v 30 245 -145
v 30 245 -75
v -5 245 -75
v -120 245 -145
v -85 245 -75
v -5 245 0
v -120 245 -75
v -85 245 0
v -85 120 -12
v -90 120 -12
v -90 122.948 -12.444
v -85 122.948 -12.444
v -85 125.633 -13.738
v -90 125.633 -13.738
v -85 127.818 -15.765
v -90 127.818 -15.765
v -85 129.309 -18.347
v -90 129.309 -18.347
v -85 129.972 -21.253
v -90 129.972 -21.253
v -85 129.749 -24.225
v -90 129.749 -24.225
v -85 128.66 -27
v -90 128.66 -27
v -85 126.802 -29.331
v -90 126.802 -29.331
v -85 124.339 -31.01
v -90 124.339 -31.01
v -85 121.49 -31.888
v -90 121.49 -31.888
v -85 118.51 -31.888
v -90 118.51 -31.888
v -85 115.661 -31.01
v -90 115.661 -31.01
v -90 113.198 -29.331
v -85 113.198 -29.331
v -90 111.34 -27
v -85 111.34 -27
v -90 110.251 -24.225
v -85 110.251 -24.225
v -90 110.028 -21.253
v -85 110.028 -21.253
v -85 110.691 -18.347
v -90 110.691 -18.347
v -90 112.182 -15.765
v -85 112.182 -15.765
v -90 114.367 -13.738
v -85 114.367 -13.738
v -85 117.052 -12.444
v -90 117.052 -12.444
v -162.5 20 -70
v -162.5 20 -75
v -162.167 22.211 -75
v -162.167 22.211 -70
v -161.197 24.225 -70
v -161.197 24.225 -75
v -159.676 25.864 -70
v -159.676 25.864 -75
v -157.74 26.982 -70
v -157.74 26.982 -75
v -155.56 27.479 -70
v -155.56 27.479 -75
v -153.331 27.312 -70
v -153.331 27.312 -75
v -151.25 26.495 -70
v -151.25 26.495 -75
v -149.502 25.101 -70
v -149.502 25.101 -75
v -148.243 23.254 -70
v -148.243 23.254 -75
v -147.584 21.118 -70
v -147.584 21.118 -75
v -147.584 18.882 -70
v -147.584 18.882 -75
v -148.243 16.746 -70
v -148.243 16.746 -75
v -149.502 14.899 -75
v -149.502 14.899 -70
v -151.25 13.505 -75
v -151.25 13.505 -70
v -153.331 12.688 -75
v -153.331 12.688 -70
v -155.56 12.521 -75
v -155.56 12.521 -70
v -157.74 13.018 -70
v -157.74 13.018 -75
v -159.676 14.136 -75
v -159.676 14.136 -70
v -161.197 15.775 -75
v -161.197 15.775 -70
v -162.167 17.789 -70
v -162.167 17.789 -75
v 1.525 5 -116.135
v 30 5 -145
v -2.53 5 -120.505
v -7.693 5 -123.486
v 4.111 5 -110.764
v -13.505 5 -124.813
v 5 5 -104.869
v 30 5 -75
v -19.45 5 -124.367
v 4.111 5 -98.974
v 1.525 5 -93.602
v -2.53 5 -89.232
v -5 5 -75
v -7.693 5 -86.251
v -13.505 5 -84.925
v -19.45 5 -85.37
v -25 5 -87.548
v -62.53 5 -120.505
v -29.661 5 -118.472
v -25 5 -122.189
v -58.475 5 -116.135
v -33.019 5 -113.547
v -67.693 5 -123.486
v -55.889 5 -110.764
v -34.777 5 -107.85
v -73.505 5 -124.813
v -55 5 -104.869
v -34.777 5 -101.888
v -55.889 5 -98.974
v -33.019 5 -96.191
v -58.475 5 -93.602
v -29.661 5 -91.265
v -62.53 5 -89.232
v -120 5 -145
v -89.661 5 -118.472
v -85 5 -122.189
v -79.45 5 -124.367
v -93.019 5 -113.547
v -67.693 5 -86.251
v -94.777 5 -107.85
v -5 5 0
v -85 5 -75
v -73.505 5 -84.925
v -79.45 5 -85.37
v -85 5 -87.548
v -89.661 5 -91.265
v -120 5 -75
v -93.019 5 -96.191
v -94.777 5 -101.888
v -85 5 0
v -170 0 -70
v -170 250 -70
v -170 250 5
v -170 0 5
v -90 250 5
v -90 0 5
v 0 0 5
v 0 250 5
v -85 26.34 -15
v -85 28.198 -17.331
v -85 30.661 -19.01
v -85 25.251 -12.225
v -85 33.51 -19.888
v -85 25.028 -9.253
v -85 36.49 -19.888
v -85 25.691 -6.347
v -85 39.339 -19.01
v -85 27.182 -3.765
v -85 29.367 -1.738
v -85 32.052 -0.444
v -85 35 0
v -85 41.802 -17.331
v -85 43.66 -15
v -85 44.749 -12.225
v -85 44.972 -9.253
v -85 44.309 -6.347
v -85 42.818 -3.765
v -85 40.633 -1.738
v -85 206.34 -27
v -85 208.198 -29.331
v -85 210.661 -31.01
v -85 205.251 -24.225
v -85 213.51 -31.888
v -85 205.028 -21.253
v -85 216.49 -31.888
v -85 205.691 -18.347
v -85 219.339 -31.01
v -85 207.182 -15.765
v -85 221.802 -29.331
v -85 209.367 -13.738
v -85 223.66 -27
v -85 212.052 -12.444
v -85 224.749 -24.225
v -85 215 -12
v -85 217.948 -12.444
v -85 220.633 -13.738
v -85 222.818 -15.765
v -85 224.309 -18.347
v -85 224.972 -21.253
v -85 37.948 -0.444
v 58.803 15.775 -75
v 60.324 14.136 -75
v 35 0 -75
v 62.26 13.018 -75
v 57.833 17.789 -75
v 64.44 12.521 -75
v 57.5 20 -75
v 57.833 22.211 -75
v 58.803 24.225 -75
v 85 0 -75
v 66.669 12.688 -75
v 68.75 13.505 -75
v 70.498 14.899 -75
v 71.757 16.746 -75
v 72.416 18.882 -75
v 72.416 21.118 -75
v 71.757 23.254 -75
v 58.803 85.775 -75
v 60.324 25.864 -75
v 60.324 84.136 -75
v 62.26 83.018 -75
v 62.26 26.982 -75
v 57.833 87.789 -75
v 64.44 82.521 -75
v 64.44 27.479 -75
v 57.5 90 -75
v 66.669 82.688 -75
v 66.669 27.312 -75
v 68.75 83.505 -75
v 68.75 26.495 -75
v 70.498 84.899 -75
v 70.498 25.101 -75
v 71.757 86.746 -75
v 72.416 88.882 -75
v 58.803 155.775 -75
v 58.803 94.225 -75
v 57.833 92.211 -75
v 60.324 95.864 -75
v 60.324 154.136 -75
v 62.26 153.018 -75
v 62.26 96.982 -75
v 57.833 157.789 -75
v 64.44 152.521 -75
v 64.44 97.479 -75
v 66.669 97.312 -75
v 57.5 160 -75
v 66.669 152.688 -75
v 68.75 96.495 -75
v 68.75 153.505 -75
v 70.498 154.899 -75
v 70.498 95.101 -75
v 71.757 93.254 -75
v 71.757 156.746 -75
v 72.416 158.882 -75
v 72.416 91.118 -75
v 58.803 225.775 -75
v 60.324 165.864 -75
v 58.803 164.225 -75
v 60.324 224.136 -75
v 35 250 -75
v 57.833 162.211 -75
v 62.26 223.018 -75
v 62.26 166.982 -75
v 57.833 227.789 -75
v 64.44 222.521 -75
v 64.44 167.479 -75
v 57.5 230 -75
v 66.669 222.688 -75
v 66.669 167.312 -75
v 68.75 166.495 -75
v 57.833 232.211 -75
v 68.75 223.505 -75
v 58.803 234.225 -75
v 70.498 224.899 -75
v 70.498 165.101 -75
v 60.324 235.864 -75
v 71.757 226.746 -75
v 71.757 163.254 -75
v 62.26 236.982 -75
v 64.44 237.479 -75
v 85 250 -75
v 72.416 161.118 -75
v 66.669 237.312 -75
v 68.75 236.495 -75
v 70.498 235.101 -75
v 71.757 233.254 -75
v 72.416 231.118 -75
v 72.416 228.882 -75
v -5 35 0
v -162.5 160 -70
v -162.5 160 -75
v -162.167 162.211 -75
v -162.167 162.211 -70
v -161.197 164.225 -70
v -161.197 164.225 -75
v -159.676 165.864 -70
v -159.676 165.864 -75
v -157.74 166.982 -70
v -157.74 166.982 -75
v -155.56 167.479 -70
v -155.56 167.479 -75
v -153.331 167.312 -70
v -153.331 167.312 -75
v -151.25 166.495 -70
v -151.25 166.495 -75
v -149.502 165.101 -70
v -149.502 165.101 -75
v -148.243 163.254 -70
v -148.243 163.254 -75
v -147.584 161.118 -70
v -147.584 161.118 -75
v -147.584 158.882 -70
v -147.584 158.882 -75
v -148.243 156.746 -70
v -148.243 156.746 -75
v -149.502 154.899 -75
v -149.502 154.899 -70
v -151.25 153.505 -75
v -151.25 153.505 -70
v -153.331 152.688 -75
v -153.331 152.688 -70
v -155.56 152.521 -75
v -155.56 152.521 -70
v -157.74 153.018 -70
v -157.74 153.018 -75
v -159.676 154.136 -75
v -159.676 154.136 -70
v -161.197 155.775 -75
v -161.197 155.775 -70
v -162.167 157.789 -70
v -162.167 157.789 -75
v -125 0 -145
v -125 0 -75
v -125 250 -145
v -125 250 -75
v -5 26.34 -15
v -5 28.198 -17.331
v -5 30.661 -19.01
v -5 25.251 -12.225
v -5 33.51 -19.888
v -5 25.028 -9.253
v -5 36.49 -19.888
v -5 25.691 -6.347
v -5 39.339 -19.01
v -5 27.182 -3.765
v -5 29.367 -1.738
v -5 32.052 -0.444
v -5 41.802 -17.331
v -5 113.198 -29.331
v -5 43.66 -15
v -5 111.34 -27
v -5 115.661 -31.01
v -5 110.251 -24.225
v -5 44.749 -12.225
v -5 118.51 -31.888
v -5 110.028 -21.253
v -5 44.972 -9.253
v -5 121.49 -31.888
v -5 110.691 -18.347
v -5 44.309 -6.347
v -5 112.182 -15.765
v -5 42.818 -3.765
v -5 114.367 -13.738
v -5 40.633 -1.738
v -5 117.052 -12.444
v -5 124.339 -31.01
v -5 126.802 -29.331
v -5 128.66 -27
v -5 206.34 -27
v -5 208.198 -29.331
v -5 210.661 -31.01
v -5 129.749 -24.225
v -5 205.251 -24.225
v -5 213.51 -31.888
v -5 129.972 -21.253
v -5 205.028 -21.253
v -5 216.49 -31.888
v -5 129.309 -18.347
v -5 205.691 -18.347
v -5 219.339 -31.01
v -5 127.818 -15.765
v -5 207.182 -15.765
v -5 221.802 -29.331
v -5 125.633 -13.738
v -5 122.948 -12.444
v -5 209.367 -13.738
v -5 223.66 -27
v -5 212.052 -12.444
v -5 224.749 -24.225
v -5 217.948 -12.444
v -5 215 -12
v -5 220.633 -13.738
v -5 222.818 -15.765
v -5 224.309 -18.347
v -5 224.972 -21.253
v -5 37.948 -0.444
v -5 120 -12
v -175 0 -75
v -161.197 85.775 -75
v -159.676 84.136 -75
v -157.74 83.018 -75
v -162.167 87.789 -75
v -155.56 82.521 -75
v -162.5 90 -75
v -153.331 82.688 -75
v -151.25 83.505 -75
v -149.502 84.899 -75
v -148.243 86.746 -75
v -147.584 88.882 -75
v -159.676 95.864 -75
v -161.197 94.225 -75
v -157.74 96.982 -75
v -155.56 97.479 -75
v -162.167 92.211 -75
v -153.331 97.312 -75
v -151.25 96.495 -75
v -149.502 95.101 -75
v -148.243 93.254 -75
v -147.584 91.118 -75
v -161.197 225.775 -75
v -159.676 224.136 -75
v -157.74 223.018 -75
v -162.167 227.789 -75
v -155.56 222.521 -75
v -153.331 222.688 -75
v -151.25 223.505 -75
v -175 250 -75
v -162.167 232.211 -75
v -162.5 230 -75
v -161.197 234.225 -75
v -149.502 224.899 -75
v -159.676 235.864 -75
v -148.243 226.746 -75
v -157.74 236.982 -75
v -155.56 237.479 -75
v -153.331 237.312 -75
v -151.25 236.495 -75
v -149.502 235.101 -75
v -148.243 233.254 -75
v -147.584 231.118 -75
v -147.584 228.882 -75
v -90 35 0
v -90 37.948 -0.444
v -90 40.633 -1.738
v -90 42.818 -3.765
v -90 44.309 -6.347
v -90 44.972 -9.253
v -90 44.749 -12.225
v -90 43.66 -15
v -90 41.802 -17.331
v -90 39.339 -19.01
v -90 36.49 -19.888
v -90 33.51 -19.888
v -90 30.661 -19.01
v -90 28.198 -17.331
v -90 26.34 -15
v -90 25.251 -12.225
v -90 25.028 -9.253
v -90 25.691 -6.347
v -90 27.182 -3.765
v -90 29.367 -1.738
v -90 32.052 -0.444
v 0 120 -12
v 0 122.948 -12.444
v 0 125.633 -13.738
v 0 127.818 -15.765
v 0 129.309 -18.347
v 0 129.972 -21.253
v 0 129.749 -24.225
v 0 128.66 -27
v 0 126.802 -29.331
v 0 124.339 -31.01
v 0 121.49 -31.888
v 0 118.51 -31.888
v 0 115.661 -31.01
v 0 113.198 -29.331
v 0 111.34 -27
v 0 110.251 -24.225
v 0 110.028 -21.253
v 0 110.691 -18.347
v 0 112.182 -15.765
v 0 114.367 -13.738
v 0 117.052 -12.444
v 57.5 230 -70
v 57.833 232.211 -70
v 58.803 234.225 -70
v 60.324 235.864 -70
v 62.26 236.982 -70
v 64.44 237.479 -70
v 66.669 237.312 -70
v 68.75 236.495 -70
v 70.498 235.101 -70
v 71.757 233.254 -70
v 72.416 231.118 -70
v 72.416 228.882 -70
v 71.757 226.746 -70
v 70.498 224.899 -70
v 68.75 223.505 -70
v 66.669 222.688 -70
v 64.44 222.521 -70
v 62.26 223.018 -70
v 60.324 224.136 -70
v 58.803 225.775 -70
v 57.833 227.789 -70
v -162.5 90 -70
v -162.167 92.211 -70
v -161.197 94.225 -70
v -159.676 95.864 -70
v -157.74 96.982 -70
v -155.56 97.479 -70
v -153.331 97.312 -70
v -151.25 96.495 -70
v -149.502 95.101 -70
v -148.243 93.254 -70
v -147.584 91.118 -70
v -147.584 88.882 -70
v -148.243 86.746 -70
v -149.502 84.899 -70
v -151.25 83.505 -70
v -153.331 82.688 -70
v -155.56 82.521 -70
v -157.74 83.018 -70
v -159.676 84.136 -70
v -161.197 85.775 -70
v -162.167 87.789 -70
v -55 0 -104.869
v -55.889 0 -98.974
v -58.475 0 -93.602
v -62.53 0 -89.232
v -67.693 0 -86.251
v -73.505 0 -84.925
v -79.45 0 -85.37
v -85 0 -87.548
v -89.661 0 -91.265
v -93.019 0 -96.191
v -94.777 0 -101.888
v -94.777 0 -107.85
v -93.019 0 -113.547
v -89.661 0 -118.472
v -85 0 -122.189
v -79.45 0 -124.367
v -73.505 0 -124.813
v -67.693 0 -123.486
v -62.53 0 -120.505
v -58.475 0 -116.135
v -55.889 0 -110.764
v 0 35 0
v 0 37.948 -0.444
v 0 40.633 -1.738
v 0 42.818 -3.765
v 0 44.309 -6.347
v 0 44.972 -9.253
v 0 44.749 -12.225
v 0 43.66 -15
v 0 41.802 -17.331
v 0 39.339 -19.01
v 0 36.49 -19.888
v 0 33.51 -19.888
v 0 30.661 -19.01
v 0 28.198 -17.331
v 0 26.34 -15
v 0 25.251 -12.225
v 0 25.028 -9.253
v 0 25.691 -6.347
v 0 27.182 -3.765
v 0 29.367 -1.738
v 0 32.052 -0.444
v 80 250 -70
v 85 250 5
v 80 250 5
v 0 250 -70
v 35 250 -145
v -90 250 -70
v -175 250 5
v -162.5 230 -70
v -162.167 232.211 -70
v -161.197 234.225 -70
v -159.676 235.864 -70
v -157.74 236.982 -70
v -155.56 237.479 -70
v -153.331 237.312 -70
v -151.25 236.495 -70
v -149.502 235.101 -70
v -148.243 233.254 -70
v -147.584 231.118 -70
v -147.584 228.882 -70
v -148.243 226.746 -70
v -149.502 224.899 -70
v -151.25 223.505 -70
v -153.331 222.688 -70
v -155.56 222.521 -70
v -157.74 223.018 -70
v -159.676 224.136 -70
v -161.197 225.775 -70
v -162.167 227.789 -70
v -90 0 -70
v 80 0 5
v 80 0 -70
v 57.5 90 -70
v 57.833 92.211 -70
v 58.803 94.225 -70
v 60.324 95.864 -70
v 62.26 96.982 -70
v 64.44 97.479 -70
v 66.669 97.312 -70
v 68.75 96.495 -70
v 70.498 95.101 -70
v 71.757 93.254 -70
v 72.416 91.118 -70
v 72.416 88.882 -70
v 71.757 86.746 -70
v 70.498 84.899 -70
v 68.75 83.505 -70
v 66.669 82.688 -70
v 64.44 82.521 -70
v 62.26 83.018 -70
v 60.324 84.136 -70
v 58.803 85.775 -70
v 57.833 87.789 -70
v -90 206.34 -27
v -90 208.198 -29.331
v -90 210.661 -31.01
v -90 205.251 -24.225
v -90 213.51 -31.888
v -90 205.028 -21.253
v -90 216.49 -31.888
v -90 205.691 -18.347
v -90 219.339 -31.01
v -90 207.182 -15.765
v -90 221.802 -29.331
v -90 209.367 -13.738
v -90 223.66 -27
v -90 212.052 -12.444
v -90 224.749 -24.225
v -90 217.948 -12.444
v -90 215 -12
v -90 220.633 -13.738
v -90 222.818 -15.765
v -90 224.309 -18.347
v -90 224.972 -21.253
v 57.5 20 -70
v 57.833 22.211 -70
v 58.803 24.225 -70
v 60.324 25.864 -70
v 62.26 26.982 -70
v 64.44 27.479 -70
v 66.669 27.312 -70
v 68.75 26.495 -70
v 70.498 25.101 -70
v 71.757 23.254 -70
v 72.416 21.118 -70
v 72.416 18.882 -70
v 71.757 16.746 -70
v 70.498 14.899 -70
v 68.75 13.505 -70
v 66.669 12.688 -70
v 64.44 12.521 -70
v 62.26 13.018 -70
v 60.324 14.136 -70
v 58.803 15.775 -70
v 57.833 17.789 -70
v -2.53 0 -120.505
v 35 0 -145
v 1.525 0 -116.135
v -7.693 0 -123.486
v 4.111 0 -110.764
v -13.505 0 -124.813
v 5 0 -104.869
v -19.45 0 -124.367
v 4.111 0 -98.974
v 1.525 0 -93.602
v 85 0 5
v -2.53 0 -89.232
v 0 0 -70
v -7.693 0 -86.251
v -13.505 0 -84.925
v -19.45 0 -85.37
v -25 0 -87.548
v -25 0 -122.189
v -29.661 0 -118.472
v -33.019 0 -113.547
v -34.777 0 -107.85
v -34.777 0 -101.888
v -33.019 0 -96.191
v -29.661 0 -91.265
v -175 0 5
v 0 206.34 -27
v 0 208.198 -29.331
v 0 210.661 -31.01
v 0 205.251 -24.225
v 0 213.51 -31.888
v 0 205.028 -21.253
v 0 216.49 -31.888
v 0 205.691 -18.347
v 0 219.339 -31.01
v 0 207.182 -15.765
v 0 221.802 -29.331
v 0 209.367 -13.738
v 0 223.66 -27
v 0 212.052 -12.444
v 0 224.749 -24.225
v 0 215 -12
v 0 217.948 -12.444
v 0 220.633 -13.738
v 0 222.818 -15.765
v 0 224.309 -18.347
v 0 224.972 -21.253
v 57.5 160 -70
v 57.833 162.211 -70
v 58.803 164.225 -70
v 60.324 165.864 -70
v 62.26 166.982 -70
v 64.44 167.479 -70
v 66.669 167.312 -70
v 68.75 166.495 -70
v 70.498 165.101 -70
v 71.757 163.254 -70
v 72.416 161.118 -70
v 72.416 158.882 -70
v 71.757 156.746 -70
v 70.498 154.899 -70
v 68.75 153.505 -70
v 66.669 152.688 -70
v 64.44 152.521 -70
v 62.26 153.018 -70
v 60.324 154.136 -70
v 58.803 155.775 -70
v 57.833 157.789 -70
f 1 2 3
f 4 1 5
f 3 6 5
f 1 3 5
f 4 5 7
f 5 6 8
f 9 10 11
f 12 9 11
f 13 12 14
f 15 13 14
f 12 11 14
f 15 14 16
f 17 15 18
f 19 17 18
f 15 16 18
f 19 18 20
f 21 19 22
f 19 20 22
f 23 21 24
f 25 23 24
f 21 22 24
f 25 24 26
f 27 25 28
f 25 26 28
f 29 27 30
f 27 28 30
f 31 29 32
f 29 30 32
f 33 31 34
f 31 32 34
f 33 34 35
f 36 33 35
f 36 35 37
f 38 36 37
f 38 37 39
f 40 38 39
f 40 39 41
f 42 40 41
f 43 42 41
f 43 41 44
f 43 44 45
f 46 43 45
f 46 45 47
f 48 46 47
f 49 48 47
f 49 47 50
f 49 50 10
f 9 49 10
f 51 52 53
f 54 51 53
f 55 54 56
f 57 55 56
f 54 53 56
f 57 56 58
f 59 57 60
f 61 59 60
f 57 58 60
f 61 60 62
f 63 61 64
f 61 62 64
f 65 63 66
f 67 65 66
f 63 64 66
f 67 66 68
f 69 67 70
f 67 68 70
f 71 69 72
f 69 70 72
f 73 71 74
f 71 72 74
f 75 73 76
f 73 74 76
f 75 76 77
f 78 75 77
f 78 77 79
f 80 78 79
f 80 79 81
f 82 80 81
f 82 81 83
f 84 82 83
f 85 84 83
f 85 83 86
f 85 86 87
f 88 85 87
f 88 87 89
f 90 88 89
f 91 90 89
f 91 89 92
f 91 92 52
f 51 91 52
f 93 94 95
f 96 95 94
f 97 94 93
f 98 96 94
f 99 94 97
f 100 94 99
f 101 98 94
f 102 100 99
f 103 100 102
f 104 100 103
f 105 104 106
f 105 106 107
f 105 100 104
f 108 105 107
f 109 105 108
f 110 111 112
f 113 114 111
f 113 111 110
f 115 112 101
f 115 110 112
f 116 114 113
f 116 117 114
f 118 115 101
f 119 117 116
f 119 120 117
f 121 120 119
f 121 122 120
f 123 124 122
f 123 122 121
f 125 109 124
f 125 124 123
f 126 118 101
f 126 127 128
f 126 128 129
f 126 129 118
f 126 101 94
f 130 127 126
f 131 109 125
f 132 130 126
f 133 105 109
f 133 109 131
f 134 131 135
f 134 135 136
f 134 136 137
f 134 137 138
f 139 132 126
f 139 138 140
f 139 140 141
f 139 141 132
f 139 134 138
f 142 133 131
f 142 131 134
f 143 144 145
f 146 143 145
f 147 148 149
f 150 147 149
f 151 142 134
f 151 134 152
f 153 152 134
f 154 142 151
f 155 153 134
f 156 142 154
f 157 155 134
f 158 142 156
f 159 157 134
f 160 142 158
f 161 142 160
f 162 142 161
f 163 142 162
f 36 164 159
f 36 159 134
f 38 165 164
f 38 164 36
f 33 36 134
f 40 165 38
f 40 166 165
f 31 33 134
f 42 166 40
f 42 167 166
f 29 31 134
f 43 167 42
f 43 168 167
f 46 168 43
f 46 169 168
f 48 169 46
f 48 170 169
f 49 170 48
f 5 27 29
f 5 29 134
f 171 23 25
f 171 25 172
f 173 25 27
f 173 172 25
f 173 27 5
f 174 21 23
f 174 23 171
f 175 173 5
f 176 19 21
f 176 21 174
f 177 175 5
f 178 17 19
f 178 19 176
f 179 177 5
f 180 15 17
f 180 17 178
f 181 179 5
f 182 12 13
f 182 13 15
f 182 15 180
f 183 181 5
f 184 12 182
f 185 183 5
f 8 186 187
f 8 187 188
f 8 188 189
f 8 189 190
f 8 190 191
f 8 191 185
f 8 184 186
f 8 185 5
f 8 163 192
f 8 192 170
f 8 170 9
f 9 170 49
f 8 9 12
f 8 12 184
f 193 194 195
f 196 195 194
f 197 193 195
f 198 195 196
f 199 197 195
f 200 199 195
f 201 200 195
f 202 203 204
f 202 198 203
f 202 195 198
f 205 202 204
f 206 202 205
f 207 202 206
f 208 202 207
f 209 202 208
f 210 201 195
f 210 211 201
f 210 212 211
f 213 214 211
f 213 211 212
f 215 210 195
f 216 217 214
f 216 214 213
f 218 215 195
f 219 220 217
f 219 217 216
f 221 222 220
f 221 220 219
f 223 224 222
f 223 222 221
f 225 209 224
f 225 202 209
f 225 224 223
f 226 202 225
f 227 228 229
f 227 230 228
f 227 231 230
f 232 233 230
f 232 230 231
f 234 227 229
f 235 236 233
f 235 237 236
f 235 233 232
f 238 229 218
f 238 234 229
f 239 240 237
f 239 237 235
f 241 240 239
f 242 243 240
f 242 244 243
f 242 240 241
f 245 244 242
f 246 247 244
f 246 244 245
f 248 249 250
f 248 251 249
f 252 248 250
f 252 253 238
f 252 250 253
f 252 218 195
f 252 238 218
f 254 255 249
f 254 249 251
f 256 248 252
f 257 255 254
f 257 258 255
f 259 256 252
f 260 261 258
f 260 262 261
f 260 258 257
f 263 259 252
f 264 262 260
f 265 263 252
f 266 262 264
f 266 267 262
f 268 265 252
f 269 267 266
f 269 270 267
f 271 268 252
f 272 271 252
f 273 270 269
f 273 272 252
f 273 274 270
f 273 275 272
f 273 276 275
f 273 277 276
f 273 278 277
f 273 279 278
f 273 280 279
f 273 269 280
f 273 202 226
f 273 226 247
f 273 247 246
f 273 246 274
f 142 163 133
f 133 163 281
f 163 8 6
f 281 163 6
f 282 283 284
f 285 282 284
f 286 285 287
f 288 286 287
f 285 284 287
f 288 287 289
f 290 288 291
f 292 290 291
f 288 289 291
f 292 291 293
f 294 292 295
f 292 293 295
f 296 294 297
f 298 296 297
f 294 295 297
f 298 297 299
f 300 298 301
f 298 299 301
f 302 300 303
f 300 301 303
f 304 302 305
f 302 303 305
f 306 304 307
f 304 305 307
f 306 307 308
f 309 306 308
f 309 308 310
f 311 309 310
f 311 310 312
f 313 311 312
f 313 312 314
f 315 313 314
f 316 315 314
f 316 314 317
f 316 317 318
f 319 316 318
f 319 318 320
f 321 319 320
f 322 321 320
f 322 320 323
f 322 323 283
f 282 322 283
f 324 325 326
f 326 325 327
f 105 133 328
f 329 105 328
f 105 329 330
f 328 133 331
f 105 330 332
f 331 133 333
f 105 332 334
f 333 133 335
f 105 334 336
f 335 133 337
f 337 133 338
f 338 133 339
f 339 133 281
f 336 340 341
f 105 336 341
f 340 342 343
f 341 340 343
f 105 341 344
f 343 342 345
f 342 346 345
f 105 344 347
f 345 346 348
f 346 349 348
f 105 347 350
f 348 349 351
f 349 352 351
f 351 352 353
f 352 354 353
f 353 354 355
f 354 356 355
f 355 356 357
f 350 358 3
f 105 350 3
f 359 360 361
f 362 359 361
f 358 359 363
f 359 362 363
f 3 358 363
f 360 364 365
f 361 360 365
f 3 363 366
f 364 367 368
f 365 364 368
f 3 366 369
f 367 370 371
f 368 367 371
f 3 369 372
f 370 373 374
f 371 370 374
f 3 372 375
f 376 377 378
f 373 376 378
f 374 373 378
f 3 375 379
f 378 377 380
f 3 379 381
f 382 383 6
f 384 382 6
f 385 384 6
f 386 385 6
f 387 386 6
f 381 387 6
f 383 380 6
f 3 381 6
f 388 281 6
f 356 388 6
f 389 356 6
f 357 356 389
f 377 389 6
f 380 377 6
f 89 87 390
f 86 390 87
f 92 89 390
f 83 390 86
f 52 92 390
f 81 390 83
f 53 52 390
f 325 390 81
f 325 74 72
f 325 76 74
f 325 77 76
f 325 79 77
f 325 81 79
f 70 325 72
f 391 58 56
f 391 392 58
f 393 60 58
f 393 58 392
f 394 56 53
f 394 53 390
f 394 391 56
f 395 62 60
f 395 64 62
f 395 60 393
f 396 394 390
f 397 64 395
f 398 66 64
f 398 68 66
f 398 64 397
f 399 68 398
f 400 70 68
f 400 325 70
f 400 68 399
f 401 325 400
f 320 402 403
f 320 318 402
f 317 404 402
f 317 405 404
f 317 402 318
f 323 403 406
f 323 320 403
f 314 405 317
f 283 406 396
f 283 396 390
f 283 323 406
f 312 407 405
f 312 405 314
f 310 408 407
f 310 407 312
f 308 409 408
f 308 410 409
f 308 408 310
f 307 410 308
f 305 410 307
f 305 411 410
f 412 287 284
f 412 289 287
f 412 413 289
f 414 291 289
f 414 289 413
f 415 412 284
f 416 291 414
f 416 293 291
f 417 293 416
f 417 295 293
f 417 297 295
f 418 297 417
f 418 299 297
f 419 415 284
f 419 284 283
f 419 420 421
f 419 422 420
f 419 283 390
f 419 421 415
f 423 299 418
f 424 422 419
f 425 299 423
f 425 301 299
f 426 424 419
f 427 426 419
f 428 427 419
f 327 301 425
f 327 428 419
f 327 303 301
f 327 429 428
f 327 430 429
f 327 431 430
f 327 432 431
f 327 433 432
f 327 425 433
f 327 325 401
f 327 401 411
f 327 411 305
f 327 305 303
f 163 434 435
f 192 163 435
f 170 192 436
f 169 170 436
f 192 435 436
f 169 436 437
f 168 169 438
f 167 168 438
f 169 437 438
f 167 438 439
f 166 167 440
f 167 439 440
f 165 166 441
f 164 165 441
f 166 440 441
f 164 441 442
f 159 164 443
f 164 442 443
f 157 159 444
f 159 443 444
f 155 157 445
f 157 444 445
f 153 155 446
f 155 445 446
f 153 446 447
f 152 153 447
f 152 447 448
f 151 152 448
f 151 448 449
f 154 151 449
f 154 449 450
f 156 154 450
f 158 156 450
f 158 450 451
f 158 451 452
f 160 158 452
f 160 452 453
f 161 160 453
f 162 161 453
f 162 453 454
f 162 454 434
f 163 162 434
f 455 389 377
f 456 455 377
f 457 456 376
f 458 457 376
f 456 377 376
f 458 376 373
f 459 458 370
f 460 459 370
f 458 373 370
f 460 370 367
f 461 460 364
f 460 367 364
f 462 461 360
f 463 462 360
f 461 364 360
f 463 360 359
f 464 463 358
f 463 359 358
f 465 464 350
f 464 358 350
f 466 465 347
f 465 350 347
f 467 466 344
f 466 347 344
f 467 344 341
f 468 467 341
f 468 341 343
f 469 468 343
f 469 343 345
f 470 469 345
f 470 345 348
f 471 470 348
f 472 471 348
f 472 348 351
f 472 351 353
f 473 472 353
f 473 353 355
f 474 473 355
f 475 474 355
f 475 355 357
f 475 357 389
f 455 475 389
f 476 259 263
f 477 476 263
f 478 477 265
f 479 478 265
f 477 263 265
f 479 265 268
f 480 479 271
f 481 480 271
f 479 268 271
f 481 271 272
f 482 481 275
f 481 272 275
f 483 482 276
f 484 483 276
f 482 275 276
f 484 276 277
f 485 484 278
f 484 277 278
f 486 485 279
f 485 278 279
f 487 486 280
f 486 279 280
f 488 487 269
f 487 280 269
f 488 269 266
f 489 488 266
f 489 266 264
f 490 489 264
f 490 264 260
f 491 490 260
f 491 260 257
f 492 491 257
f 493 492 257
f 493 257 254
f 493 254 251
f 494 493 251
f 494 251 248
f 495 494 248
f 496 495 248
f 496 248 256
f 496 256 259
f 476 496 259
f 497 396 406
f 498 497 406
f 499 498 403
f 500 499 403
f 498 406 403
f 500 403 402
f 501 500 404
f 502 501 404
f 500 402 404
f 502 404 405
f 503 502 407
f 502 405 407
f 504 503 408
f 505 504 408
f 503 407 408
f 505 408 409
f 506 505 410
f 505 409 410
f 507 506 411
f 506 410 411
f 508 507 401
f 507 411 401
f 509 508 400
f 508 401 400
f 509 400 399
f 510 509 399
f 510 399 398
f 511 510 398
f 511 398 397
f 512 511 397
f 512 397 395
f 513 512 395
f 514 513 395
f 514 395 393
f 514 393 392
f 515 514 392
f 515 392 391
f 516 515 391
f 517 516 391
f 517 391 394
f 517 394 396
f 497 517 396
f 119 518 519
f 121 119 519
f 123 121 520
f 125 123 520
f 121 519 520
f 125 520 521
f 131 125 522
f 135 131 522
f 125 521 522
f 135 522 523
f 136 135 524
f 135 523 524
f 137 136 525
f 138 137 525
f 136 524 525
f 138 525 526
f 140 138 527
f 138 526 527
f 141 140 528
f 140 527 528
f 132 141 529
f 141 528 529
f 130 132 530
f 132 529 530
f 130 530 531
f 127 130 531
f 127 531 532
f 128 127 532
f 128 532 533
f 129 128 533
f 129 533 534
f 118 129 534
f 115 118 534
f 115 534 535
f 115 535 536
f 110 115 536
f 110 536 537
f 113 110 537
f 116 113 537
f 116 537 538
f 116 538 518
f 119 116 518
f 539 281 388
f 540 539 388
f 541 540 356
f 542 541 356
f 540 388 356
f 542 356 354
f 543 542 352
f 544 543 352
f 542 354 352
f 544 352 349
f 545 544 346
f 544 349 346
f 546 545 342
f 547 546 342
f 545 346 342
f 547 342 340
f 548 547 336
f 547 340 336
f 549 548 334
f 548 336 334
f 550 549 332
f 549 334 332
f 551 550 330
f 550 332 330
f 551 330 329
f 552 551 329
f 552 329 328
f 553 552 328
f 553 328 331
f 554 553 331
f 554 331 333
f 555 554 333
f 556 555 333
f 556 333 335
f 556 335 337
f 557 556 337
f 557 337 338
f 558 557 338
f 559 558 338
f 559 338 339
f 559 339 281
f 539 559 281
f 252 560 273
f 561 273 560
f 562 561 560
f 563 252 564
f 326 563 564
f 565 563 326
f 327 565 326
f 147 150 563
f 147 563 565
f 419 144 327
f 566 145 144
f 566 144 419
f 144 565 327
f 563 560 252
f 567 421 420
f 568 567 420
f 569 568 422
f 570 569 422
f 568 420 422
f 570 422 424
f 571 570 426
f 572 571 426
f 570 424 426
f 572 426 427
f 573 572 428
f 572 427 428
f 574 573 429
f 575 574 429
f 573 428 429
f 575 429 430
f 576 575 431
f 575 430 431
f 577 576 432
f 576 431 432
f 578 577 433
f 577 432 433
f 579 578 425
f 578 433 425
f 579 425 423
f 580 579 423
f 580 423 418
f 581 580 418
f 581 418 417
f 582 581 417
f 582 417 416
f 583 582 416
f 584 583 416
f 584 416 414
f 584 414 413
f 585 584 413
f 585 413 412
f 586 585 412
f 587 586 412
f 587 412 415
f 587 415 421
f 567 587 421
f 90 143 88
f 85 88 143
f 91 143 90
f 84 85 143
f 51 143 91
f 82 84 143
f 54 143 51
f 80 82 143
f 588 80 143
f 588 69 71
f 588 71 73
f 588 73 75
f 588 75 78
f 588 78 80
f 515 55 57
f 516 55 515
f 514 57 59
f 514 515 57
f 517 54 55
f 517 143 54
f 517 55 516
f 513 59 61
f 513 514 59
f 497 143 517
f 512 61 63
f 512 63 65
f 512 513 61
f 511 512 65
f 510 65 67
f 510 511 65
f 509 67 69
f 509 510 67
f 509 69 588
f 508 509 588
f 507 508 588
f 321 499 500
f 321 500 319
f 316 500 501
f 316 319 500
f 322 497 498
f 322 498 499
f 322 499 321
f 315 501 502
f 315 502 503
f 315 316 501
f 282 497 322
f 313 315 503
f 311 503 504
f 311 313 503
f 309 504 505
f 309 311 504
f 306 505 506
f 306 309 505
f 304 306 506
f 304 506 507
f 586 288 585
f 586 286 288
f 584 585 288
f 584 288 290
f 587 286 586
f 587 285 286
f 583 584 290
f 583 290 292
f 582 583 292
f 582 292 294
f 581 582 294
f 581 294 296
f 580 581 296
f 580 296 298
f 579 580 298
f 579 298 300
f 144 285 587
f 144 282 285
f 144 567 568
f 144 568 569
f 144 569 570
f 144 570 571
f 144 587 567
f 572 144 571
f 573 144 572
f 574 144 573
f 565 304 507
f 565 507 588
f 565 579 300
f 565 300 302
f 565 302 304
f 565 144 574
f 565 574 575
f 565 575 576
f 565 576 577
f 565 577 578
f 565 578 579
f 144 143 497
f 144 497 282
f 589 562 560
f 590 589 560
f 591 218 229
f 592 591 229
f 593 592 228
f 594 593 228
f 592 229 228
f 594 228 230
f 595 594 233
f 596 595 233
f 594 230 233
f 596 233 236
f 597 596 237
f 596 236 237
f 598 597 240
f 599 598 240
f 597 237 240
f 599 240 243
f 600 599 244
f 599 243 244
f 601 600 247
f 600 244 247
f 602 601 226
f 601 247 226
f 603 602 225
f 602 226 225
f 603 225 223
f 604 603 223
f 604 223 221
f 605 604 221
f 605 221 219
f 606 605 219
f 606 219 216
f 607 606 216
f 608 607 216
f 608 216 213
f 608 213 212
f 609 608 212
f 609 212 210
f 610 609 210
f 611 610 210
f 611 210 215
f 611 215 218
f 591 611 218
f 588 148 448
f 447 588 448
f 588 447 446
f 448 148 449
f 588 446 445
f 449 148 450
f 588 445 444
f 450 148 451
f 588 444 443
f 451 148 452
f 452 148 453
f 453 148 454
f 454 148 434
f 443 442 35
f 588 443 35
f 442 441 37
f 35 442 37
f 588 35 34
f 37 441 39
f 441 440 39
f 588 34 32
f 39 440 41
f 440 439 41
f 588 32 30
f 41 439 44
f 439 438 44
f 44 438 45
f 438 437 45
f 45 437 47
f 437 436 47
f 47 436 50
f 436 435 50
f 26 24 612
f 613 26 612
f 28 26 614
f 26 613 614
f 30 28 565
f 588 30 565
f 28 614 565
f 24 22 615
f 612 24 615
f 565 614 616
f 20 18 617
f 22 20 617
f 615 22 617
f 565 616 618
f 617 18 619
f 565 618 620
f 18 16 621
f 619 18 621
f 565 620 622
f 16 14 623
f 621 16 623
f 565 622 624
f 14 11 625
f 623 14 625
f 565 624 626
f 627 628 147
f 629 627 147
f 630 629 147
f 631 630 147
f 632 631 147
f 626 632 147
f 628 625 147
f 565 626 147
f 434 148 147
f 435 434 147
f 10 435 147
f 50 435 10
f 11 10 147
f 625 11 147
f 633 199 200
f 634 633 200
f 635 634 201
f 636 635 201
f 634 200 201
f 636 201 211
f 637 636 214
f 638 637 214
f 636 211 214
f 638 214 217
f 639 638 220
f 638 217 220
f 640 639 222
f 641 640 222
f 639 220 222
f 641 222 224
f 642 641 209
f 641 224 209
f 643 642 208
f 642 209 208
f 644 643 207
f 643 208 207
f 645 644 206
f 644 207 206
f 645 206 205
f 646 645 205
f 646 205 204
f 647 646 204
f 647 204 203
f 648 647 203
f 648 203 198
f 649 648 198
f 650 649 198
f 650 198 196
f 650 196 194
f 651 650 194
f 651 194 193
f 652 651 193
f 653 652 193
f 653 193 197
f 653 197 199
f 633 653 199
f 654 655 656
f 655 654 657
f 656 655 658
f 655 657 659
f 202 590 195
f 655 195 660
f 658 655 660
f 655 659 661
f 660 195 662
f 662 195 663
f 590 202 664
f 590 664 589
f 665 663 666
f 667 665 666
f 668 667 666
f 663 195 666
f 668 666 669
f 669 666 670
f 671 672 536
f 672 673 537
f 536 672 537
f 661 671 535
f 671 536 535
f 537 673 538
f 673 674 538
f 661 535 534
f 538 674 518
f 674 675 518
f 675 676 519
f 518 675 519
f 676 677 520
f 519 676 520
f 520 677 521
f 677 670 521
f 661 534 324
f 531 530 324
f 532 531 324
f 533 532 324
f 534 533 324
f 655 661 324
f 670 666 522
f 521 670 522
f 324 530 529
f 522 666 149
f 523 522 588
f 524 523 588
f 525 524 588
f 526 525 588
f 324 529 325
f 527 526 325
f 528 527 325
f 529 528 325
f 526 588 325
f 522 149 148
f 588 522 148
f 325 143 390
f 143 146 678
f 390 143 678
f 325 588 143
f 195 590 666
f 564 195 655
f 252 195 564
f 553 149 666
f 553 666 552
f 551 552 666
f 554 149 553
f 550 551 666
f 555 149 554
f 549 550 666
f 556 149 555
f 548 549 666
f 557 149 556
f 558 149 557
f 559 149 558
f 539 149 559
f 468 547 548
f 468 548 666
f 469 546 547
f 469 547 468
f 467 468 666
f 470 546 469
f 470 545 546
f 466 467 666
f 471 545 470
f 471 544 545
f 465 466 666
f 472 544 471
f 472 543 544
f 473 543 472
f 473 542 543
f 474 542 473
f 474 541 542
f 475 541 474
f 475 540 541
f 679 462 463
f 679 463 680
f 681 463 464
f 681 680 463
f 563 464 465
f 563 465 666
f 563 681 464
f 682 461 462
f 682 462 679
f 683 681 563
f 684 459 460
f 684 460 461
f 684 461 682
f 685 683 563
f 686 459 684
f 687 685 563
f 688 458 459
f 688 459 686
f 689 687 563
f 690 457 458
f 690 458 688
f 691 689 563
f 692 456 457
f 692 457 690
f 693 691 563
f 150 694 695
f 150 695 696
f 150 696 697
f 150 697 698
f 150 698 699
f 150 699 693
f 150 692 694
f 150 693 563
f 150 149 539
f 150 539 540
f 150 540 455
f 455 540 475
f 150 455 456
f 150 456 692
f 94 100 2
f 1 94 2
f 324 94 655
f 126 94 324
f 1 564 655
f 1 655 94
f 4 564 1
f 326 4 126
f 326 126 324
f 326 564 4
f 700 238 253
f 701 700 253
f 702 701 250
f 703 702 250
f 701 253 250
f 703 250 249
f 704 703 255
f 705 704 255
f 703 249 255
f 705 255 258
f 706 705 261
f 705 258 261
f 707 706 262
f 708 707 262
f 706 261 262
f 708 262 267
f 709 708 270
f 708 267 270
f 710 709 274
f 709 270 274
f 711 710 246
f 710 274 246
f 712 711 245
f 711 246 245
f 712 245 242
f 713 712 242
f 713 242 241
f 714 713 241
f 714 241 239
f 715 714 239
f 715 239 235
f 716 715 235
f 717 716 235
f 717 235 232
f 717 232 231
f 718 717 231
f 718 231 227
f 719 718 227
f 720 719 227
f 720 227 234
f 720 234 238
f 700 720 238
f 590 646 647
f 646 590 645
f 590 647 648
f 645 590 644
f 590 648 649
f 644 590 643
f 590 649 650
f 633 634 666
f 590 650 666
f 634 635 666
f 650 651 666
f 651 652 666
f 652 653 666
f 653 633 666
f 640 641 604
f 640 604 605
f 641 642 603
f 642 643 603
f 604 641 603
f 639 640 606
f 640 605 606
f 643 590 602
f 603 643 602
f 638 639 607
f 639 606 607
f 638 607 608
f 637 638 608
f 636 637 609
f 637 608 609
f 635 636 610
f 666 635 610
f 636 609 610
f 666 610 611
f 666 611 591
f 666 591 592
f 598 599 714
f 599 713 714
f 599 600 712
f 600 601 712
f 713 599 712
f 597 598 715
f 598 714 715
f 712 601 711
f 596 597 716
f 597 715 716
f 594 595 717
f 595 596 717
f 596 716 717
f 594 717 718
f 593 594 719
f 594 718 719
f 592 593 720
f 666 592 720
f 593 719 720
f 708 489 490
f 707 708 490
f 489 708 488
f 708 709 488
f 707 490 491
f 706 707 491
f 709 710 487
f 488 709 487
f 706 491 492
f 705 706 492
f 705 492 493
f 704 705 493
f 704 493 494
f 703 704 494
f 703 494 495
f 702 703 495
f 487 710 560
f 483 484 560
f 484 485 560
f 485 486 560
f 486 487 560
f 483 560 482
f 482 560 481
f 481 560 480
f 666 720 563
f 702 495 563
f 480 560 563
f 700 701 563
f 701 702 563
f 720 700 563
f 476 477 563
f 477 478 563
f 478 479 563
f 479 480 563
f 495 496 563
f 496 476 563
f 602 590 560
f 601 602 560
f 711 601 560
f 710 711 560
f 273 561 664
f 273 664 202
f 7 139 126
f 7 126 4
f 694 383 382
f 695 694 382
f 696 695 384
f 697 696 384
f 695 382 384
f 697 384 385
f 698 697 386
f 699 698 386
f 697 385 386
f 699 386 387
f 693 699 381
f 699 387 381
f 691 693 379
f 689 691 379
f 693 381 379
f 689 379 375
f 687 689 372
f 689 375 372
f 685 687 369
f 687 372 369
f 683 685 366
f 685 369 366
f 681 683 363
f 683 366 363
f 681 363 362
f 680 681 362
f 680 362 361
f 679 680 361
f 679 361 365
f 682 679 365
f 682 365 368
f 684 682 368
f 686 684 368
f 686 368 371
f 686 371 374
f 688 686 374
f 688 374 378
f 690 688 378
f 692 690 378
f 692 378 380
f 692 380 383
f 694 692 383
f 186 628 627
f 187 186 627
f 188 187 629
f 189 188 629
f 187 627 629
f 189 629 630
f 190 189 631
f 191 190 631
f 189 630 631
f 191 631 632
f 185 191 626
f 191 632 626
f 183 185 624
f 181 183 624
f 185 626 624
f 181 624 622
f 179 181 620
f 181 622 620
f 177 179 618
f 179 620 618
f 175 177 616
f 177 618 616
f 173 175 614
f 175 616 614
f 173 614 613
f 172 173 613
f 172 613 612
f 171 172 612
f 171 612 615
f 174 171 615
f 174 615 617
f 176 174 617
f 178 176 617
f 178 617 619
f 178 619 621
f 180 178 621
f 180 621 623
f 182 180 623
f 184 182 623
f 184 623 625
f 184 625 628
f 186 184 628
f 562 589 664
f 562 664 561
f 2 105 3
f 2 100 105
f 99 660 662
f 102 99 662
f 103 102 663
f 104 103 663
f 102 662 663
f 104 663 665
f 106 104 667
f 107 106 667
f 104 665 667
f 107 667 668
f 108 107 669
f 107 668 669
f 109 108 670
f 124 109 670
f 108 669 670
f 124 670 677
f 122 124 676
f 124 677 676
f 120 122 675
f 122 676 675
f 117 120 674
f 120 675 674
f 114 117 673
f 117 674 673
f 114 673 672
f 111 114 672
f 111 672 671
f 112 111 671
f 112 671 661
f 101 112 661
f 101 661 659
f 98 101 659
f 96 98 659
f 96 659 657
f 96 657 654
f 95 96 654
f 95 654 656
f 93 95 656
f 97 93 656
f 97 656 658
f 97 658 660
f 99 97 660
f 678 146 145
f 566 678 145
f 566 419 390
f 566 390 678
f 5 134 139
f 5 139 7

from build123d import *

# Parameters (mm, degrees)
ESQUISSE1_W             = 90
ESQUISSE1_H             = 250
BOSS_EXTRU_1_DEPTH      = 5
ESQUISSE2_W             = 90
ESQUISSE2_H             = 250
ESQUISSE2_W_2           = 80
ESQUISSE2_H_2           = 240
BOSS_EXTRU_2_DEPTH      = 70
BOSS_EXTRU_3_DEPTH      = 5
ESQUISSE4_R             = 10
ENL_V_MAT_EXTRU_2_DEPTH = 171
ESQUISSE5_W             = 80
ESQUISSE5_H             = 250
BOSS_EXTRU_4_DEPTH      = 5
ESQUISSE6_W             = 80
ESQUISSE6_H             = 250
BOSS_EXTRU_5_DEPTH      = 5
ESQUISSE7_W             = 160
ESQUISSE7_H             = 250
ESQUISSE7_W_2           = 150
ESQUISSE7_H_2           = 240
BOSS_EXTRU_6_DEPTH      = 70
ESQUISSE10_R            = 7.5
ENL_V_MAT_EXTRU_3_DEPTH = 50
ESQUISSE12_R            = 20
ENL_V_MAT_EXTRU_4_DEPTH = 10


with BuildPart() as part:
    # Esquisse1 → Boss.-Extru.1 (new body)
    with BuildSketch(Plane.XY):
        with Locations((-45, 125)):
            Rectangle(ESQUISSE1_W, ESQUISSE1_H)
    extrude(amount=BOSS_EXTRU_1_DEPTH)

    # Esquisse2 → Boss.-Extru.2 (add)
    with BuildSketch(Plane(origin=(0, 0, 0), x_dir=(-1, 0, 0), z_dir=(0, 0, -1))):
        with Locations((45, 125)):
            Rectangle(ESQUISSE2_W, ESQUISSE2_H)
        with Locations((45, 125)):
            Rectangle(ESQUISSE2_W_2, ESQUISSE2_H_2, mode=Mode.SUBTRACT)
    extrude(amount=BOSS_EXTRU_2_DEPTH)

    # Esquisse3 → Boss.-Extru.3 (add)
    with BuildSketch(Plane(origin=(0, 0, -70), x_dir=(-1, 0, 0), z_dir=(0, 0, -1))):
        Polygon((6.025463364, 250), (-80, 250), (-80, 0), (-15, 0), (45, 0), (45, 5), (5, 5), (5, 245), (45, 245), (45, 250), align=None)
    boss_extru_3 = extrude(amount=BOSS_EXTRU_3_DEPTH)

    # Symétrie1: Boss.-Extru.3 across plane
    add(boss_extru_3.mirror(Plane(origin=(-45, 245, -75), x_dir=(0, 0, 1), z_dir=(1, 0, 0))))

    # Esquisse4 → Enlèv. mat.-Extru.2 (cut, through all)
    with BuildSketch(Plane.ZY.offset(90)):
        with Locations((-22, 215)):
            Circle(ESQUISSE4_R)
        with Locations((-22, 120)):
            Circle(ESQUISSE4_R)
        with Locations((-10, 35)):
            Circle(ESQUISSE4_R)
    extrude(amount=-ENL_V_MAT_EXTRU_2_DEPTH, mode=Mode.SUBTRACT)

    # Esquisse5 → Boss.-Extru.4 (add)
    with BuildSketch(Plane(origin=(80, 0, 0), x_dir=(0, 0, -1), z_dir=(1, 0, 0))):
        with Locations((35, 125)):
            Rectangle(ESQUISSE5_W, ESQUISSE5_H)
    extrude(amount=BOSS_EXTRU_4_DEPTH)

    # Esquisse6 → Boss.-Extru.5 (add)
    with BuildSketch(Plane.ZY.offset(170)):
        with Locations((-35, 125)):
            Rectangle(ESQUISSE6_W, ESQUISSE6_H)
    extrude(amount=BOSS_EXTRU_5_DEPTH)

    # Esquisse7 → Boss.-Extru.6 (add)
    with BuildSketch(Plane(origin=(0, 0, -75), x_dir=(-1, 0, 0), z_dir=(0, 0, -1))):
        with Locations((45, 125)):
            Rectangle(ESQUISSE7_W, ESQUISSE7_H)
        with Locations((45, 125)):
            Rectangle(ESQUISSE7_W_2, ESQUISSE7_H_2, mode=Mode.SUBTRACT)
    extrude(amount=BOSS_EXTRU_6_DEPTH)

    # Esquisse10 → Enlèv. mat.-Extru.3 (cut)
    with BuildSketch(Plane(origin=(0, 0, -75), x_dir=(-1, 0, 0), z_dir=(0, 0, -1))):
        with Locations((155, 230)):
            Circle(ESQUISSE10_R)
        with Locations((-65, 230)):
            Circle(ESQUISSE10_R)
        with Locations((-65, 160)):
            Circle(ESQUISSE10_R)
        with Locations((155, 160)):
            Circle(ESQUISSE10_R)
        with Locations((-65, 90)):
            Circle(ESQUISSE10_R)
        with Locations((155, 90)):
            Circle(ESQUISSE10_R)
        with Locations((-65, 20)):
            Circle(ESQUISSE10_R)
        with Locations((155, 20)):
            Circle(ESQUISSE10_R)
    extrude(amount=-ENL_V_MAT_EXTRU_3_DEPTH, mode=Mode.SUBTRACT)

    # Esquisse12 → Enlèv. mat.-Extru.4 (cut)
    with BuildSketch(Plane.XZ):
        with Locations((-15, -104.868866133)):
            Circle(ESQUISSE12_R)
        with Locations((-75, -104.868866133)):
            Circle(ESQUISSE12_R)
    extrude(amount=-ENL_V_MAT_EXTRU_4_DEPTH, mode=Mode.SUBTRACT)


solid = part.part
